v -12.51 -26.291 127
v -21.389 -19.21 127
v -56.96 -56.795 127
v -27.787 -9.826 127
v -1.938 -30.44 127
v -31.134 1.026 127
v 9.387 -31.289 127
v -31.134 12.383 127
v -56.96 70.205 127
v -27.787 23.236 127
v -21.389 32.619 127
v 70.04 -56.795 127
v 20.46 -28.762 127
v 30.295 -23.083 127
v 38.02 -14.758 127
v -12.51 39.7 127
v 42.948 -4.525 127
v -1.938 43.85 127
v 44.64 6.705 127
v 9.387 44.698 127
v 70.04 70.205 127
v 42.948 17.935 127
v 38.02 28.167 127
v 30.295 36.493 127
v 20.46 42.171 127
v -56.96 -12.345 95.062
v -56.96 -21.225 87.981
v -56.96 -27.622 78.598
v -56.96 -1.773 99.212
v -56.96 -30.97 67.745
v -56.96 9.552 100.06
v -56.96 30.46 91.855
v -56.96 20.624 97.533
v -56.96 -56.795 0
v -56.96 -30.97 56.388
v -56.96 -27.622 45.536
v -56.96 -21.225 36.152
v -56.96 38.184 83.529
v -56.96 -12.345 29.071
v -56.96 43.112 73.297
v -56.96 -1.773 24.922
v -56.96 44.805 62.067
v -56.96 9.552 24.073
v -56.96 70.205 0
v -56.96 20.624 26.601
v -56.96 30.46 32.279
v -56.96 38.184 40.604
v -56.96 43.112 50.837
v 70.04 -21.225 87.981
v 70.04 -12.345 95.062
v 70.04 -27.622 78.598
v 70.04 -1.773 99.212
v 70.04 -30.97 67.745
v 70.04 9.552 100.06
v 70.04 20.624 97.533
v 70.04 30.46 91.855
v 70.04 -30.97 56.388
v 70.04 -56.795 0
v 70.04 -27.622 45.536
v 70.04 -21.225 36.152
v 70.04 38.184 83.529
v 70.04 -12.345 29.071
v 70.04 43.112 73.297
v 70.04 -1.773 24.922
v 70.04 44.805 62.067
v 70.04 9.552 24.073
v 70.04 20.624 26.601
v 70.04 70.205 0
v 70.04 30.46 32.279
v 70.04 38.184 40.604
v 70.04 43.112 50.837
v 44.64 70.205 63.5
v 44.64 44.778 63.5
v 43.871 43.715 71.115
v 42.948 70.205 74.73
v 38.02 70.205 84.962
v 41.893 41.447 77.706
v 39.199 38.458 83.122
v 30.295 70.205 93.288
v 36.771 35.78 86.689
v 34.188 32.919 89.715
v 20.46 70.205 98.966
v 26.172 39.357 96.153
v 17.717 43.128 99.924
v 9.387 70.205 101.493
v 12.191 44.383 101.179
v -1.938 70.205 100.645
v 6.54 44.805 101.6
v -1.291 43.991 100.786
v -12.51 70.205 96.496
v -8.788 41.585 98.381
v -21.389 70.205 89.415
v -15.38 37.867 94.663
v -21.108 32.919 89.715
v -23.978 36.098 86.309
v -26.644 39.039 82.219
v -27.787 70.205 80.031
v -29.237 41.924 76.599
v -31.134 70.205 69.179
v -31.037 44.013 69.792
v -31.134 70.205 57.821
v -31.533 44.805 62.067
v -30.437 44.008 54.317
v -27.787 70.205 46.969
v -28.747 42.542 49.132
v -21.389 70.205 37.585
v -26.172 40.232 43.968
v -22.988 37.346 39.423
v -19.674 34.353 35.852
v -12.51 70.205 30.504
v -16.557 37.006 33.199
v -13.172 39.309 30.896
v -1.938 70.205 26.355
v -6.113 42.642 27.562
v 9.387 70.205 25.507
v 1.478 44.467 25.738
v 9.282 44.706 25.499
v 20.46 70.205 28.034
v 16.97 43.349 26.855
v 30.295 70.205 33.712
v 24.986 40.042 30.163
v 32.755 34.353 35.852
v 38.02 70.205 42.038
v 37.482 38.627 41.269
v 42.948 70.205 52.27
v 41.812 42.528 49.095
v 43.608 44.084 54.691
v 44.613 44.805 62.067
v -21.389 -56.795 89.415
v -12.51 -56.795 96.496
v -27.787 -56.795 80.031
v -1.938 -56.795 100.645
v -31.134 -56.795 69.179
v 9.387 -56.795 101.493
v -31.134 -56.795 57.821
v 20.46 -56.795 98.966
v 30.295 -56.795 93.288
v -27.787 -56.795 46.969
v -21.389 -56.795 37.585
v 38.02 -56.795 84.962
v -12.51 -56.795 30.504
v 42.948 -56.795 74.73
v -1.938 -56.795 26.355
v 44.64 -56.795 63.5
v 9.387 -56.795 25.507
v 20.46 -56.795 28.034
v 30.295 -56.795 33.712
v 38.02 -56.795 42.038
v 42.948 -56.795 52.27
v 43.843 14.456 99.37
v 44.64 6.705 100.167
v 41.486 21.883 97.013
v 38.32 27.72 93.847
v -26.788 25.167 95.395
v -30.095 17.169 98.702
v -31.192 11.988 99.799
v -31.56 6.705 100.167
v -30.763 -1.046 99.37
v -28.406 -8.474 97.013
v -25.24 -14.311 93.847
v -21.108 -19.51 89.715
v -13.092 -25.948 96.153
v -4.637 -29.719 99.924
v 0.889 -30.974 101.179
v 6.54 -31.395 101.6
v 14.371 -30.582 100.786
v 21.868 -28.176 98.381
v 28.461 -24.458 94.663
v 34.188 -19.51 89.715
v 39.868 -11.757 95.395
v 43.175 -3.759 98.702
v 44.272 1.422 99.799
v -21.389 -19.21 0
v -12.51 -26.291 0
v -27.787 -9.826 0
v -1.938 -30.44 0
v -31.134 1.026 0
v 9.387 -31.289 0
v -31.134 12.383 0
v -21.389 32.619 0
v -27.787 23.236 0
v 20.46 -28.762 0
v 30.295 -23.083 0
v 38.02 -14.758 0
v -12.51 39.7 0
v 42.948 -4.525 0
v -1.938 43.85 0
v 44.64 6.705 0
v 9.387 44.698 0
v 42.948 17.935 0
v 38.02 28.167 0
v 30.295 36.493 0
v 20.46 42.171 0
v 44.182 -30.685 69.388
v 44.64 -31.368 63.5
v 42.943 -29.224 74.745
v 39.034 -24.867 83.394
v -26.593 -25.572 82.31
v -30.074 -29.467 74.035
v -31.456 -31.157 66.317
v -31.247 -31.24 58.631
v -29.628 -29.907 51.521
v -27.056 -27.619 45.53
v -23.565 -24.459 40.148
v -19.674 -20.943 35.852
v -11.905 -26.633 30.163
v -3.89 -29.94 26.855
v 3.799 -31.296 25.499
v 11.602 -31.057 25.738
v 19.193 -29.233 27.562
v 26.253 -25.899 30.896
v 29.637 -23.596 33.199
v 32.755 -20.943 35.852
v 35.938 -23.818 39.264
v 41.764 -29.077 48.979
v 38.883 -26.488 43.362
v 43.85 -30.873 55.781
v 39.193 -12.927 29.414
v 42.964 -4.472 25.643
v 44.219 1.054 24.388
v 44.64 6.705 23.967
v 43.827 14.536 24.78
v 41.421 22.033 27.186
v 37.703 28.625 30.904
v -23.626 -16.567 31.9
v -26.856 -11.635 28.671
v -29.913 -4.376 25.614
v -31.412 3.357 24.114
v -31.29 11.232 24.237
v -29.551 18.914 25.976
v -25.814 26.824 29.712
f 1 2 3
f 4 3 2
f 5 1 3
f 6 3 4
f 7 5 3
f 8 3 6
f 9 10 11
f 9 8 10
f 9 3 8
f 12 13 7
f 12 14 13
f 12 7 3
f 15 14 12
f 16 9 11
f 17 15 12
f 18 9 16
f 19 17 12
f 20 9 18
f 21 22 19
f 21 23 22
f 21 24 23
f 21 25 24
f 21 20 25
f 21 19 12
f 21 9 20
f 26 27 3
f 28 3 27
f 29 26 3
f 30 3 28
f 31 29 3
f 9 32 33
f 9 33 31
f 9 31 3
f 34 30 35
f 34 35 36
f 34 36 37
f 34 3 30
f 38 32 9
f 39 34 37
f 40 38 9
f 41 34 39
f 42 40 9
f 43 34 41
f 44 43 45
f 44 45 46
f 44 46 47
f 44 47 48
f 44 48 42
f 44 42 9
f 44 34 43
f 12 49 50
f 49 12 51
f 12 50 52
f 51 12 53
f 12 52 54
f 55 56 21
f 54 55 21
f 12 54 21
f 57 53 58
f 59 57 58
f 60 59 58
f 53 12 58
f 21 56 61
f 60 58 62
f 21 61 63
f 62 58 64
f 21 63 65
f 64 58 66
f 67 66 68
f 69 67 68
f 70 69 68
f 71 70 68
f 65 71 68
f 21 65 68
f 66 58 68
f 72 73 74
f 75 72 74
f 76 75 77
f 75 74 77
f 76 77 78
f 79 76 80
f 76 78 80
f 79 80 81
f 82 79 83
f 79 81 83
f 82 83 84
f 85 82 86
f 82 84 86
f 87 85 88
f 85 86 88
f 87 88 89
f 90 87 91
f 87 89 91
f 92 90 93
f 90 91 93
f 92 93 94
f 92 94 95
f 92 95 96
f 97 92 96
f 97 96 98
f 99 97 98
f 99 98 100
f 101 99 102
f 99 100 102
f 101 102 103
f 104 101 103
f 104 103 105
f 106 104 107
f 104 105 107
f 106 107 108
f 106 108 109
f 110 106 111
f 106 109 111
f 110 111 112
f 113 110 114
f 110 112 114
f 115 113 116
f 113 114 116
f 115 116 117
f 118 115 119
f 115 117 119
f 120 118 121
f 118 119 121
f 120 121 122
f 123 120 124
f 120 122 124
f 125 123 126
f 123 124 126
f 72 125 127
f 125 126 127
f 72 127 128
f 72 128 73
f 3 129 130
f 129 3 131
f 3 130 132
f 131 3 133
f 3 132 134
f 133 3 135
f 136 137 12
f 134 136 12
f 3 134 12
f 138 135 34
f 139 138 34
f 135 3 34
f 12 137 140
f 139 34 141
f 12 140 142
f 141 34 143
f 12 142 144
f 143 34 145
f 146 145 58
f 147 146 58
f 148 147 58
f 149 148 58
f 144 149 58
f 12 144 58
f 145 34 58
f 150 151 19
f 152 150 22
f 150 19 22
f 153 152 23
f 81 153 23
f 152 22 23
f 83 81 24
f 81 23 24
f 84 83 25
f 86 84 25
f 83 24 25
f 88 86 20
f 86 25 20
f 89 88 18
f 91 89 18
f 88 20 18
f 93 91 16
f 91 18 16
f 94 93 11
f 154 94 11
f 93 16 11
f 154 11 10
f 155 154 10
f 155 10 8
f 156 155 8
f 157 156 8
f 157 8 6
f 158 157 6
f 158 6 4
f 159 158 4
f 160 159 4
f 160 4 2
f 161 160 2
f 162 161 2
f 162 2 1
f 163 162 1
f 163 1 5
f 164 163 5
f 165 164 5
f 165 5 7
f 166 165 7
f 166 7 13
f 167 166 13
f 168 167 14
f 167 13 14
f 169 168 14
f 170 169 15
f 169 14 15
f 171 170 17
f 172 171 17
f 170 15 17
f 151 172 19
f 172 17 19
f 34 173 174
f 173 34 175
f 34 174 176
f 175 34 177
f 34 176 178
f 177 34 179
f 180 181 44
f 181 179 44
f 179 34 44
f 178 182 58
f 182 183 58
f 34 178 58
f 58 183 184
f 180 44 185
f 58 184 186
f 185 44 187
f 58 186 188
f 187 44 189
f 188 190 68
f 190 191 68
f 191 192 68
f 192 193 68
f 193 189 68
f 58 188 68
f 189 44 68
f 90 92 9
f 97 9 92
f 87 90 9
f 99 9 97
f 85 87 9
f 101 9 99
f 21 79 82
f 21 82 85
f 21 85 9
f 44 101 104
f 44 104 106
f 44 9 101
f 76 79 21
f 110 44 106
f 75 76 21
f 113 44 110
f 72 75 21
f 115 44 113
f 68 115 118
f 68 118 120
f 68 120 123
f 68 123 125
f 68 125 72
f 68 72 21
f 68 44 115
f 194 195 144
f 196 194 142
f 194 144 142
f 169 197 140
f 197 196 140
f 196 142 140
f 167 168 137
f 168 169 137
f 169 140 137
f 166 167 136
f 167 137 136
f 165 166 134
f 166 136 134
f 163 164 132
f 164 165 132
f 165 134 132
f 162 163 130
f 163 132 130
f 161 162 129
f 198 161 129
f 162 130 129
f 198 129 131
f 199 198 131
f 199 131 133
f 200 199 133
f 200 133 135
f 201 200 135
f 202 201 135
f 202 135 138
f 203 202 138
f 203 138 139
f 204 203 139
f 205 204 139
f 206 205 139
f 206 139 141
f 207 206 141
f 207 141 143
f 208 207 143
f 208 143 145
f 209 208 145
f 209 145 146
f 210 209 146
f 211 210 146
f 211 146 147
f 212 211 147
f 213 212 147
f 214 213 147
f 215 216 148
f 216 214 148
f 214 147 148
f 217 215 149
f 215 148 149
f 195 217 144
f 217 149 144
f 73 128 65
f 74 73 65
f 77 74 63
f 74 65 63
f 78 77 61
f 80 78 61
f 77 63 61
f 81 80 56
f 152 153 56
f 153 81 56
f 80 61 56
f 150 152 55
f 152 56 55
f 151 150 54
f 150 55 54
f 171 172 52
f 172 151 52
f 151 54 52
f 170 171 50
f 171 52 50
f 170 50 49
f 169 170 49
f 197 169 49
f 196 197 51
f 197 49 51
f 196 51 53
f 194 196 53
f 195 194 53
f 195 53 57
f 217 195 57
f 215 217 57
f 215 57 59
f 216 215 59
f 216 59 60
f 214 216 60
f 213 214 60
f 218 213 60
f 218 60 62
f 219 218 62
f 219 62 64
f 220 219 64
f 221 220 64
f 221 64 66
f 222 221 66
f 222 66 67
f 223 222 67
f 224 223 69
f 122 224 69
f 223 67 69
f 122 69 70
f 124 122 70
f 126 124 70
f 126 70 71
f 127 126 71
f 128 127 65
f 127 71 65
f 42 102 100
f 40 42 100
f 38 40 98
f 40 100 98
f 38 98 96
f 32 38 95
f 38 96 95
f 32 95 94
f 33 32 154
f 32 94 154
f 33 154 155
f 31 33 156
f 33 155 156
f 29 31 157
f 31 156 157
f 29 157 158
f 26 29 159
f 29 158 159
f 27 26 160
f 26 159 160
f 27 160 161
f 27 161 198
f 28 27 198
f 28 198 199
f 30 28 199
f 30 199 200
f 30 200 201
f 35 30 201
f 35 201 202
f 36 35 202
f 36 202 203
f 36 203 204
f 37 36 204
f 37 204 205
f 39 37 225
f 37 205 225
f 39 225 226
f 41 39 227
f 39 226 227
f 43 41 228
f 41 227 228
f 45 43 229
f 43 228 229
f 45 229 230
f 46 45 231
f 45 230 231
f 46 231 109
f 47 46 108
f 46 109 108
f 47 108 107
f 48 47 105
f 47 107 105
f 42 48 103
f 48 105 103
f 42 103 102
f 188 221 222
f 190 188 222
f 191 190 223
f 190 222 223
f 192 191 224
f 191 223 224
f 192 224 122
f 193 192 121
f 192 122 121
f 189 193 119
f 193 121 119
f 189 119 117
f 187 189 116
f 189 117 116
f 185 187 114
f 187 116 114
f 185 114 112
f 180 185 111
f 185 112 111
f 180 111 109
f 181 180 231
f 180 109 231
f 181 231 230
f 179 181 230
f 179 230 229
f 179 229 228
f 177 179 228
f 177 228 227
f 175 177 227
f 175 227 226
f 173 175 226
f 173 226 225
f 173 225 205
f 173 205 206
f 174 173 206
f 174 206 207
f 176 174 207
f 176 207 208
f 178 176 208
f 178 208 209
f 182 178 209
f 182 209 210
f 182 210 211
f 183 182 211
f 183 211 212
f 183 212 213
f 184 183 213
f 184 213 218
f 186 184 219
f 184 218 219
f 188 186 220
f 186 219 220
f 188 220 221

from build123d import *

# Parameters (mm, degrees)
F0_W     = 127
F0_H     = 127
F1_DEPTH = 127
F2_R     = 38.1
F3_DEPTH = 127.001
F4_R     = 38.1
F5_DEPTH = 127.001
F6_R     = 38.1
F7_DEPTH = 127.001


with BuildPart() as f1:
    # F0 (on Top) → F1 (new body)
    with BuildSketch(Plane.XY):
        with Locations((6.54018, 6.704748)):
            Rectangle(F0_W, F0_H)
    extrude(amount=F1_DEPTH)

    # F2 (on face) → F3 (cut, through all)
    with BuildSketch(Plane.XY.offset(127)):
        with Locations((6.54018, 6.704748)):
            Circle(F2_R)
    extrude(amount=-F3_DEPTH, mode=Mode.SUBTRACT)

    # F4 (on face) → F5 (cut, through all)
    with BuildSketch(Plane.YZ.offset(70.04018)):
        with Locations((6.704748, 62.066816)):
            Circle(F4_R)
    extrude(amount=-F5_DEPTH, mode=Mode.SUBTRACT)

    # F6 (on face) → F7 (cut, through all)
    with BuildSketch(Plane.XZ.offset(56.795252)):
        with Locations((6.54018, 63.5)):
            Circle(F6_R)
    extrude(amount=-F7_DEPTH, mode=Mode.SUBTRACT)


solid = f1.part
